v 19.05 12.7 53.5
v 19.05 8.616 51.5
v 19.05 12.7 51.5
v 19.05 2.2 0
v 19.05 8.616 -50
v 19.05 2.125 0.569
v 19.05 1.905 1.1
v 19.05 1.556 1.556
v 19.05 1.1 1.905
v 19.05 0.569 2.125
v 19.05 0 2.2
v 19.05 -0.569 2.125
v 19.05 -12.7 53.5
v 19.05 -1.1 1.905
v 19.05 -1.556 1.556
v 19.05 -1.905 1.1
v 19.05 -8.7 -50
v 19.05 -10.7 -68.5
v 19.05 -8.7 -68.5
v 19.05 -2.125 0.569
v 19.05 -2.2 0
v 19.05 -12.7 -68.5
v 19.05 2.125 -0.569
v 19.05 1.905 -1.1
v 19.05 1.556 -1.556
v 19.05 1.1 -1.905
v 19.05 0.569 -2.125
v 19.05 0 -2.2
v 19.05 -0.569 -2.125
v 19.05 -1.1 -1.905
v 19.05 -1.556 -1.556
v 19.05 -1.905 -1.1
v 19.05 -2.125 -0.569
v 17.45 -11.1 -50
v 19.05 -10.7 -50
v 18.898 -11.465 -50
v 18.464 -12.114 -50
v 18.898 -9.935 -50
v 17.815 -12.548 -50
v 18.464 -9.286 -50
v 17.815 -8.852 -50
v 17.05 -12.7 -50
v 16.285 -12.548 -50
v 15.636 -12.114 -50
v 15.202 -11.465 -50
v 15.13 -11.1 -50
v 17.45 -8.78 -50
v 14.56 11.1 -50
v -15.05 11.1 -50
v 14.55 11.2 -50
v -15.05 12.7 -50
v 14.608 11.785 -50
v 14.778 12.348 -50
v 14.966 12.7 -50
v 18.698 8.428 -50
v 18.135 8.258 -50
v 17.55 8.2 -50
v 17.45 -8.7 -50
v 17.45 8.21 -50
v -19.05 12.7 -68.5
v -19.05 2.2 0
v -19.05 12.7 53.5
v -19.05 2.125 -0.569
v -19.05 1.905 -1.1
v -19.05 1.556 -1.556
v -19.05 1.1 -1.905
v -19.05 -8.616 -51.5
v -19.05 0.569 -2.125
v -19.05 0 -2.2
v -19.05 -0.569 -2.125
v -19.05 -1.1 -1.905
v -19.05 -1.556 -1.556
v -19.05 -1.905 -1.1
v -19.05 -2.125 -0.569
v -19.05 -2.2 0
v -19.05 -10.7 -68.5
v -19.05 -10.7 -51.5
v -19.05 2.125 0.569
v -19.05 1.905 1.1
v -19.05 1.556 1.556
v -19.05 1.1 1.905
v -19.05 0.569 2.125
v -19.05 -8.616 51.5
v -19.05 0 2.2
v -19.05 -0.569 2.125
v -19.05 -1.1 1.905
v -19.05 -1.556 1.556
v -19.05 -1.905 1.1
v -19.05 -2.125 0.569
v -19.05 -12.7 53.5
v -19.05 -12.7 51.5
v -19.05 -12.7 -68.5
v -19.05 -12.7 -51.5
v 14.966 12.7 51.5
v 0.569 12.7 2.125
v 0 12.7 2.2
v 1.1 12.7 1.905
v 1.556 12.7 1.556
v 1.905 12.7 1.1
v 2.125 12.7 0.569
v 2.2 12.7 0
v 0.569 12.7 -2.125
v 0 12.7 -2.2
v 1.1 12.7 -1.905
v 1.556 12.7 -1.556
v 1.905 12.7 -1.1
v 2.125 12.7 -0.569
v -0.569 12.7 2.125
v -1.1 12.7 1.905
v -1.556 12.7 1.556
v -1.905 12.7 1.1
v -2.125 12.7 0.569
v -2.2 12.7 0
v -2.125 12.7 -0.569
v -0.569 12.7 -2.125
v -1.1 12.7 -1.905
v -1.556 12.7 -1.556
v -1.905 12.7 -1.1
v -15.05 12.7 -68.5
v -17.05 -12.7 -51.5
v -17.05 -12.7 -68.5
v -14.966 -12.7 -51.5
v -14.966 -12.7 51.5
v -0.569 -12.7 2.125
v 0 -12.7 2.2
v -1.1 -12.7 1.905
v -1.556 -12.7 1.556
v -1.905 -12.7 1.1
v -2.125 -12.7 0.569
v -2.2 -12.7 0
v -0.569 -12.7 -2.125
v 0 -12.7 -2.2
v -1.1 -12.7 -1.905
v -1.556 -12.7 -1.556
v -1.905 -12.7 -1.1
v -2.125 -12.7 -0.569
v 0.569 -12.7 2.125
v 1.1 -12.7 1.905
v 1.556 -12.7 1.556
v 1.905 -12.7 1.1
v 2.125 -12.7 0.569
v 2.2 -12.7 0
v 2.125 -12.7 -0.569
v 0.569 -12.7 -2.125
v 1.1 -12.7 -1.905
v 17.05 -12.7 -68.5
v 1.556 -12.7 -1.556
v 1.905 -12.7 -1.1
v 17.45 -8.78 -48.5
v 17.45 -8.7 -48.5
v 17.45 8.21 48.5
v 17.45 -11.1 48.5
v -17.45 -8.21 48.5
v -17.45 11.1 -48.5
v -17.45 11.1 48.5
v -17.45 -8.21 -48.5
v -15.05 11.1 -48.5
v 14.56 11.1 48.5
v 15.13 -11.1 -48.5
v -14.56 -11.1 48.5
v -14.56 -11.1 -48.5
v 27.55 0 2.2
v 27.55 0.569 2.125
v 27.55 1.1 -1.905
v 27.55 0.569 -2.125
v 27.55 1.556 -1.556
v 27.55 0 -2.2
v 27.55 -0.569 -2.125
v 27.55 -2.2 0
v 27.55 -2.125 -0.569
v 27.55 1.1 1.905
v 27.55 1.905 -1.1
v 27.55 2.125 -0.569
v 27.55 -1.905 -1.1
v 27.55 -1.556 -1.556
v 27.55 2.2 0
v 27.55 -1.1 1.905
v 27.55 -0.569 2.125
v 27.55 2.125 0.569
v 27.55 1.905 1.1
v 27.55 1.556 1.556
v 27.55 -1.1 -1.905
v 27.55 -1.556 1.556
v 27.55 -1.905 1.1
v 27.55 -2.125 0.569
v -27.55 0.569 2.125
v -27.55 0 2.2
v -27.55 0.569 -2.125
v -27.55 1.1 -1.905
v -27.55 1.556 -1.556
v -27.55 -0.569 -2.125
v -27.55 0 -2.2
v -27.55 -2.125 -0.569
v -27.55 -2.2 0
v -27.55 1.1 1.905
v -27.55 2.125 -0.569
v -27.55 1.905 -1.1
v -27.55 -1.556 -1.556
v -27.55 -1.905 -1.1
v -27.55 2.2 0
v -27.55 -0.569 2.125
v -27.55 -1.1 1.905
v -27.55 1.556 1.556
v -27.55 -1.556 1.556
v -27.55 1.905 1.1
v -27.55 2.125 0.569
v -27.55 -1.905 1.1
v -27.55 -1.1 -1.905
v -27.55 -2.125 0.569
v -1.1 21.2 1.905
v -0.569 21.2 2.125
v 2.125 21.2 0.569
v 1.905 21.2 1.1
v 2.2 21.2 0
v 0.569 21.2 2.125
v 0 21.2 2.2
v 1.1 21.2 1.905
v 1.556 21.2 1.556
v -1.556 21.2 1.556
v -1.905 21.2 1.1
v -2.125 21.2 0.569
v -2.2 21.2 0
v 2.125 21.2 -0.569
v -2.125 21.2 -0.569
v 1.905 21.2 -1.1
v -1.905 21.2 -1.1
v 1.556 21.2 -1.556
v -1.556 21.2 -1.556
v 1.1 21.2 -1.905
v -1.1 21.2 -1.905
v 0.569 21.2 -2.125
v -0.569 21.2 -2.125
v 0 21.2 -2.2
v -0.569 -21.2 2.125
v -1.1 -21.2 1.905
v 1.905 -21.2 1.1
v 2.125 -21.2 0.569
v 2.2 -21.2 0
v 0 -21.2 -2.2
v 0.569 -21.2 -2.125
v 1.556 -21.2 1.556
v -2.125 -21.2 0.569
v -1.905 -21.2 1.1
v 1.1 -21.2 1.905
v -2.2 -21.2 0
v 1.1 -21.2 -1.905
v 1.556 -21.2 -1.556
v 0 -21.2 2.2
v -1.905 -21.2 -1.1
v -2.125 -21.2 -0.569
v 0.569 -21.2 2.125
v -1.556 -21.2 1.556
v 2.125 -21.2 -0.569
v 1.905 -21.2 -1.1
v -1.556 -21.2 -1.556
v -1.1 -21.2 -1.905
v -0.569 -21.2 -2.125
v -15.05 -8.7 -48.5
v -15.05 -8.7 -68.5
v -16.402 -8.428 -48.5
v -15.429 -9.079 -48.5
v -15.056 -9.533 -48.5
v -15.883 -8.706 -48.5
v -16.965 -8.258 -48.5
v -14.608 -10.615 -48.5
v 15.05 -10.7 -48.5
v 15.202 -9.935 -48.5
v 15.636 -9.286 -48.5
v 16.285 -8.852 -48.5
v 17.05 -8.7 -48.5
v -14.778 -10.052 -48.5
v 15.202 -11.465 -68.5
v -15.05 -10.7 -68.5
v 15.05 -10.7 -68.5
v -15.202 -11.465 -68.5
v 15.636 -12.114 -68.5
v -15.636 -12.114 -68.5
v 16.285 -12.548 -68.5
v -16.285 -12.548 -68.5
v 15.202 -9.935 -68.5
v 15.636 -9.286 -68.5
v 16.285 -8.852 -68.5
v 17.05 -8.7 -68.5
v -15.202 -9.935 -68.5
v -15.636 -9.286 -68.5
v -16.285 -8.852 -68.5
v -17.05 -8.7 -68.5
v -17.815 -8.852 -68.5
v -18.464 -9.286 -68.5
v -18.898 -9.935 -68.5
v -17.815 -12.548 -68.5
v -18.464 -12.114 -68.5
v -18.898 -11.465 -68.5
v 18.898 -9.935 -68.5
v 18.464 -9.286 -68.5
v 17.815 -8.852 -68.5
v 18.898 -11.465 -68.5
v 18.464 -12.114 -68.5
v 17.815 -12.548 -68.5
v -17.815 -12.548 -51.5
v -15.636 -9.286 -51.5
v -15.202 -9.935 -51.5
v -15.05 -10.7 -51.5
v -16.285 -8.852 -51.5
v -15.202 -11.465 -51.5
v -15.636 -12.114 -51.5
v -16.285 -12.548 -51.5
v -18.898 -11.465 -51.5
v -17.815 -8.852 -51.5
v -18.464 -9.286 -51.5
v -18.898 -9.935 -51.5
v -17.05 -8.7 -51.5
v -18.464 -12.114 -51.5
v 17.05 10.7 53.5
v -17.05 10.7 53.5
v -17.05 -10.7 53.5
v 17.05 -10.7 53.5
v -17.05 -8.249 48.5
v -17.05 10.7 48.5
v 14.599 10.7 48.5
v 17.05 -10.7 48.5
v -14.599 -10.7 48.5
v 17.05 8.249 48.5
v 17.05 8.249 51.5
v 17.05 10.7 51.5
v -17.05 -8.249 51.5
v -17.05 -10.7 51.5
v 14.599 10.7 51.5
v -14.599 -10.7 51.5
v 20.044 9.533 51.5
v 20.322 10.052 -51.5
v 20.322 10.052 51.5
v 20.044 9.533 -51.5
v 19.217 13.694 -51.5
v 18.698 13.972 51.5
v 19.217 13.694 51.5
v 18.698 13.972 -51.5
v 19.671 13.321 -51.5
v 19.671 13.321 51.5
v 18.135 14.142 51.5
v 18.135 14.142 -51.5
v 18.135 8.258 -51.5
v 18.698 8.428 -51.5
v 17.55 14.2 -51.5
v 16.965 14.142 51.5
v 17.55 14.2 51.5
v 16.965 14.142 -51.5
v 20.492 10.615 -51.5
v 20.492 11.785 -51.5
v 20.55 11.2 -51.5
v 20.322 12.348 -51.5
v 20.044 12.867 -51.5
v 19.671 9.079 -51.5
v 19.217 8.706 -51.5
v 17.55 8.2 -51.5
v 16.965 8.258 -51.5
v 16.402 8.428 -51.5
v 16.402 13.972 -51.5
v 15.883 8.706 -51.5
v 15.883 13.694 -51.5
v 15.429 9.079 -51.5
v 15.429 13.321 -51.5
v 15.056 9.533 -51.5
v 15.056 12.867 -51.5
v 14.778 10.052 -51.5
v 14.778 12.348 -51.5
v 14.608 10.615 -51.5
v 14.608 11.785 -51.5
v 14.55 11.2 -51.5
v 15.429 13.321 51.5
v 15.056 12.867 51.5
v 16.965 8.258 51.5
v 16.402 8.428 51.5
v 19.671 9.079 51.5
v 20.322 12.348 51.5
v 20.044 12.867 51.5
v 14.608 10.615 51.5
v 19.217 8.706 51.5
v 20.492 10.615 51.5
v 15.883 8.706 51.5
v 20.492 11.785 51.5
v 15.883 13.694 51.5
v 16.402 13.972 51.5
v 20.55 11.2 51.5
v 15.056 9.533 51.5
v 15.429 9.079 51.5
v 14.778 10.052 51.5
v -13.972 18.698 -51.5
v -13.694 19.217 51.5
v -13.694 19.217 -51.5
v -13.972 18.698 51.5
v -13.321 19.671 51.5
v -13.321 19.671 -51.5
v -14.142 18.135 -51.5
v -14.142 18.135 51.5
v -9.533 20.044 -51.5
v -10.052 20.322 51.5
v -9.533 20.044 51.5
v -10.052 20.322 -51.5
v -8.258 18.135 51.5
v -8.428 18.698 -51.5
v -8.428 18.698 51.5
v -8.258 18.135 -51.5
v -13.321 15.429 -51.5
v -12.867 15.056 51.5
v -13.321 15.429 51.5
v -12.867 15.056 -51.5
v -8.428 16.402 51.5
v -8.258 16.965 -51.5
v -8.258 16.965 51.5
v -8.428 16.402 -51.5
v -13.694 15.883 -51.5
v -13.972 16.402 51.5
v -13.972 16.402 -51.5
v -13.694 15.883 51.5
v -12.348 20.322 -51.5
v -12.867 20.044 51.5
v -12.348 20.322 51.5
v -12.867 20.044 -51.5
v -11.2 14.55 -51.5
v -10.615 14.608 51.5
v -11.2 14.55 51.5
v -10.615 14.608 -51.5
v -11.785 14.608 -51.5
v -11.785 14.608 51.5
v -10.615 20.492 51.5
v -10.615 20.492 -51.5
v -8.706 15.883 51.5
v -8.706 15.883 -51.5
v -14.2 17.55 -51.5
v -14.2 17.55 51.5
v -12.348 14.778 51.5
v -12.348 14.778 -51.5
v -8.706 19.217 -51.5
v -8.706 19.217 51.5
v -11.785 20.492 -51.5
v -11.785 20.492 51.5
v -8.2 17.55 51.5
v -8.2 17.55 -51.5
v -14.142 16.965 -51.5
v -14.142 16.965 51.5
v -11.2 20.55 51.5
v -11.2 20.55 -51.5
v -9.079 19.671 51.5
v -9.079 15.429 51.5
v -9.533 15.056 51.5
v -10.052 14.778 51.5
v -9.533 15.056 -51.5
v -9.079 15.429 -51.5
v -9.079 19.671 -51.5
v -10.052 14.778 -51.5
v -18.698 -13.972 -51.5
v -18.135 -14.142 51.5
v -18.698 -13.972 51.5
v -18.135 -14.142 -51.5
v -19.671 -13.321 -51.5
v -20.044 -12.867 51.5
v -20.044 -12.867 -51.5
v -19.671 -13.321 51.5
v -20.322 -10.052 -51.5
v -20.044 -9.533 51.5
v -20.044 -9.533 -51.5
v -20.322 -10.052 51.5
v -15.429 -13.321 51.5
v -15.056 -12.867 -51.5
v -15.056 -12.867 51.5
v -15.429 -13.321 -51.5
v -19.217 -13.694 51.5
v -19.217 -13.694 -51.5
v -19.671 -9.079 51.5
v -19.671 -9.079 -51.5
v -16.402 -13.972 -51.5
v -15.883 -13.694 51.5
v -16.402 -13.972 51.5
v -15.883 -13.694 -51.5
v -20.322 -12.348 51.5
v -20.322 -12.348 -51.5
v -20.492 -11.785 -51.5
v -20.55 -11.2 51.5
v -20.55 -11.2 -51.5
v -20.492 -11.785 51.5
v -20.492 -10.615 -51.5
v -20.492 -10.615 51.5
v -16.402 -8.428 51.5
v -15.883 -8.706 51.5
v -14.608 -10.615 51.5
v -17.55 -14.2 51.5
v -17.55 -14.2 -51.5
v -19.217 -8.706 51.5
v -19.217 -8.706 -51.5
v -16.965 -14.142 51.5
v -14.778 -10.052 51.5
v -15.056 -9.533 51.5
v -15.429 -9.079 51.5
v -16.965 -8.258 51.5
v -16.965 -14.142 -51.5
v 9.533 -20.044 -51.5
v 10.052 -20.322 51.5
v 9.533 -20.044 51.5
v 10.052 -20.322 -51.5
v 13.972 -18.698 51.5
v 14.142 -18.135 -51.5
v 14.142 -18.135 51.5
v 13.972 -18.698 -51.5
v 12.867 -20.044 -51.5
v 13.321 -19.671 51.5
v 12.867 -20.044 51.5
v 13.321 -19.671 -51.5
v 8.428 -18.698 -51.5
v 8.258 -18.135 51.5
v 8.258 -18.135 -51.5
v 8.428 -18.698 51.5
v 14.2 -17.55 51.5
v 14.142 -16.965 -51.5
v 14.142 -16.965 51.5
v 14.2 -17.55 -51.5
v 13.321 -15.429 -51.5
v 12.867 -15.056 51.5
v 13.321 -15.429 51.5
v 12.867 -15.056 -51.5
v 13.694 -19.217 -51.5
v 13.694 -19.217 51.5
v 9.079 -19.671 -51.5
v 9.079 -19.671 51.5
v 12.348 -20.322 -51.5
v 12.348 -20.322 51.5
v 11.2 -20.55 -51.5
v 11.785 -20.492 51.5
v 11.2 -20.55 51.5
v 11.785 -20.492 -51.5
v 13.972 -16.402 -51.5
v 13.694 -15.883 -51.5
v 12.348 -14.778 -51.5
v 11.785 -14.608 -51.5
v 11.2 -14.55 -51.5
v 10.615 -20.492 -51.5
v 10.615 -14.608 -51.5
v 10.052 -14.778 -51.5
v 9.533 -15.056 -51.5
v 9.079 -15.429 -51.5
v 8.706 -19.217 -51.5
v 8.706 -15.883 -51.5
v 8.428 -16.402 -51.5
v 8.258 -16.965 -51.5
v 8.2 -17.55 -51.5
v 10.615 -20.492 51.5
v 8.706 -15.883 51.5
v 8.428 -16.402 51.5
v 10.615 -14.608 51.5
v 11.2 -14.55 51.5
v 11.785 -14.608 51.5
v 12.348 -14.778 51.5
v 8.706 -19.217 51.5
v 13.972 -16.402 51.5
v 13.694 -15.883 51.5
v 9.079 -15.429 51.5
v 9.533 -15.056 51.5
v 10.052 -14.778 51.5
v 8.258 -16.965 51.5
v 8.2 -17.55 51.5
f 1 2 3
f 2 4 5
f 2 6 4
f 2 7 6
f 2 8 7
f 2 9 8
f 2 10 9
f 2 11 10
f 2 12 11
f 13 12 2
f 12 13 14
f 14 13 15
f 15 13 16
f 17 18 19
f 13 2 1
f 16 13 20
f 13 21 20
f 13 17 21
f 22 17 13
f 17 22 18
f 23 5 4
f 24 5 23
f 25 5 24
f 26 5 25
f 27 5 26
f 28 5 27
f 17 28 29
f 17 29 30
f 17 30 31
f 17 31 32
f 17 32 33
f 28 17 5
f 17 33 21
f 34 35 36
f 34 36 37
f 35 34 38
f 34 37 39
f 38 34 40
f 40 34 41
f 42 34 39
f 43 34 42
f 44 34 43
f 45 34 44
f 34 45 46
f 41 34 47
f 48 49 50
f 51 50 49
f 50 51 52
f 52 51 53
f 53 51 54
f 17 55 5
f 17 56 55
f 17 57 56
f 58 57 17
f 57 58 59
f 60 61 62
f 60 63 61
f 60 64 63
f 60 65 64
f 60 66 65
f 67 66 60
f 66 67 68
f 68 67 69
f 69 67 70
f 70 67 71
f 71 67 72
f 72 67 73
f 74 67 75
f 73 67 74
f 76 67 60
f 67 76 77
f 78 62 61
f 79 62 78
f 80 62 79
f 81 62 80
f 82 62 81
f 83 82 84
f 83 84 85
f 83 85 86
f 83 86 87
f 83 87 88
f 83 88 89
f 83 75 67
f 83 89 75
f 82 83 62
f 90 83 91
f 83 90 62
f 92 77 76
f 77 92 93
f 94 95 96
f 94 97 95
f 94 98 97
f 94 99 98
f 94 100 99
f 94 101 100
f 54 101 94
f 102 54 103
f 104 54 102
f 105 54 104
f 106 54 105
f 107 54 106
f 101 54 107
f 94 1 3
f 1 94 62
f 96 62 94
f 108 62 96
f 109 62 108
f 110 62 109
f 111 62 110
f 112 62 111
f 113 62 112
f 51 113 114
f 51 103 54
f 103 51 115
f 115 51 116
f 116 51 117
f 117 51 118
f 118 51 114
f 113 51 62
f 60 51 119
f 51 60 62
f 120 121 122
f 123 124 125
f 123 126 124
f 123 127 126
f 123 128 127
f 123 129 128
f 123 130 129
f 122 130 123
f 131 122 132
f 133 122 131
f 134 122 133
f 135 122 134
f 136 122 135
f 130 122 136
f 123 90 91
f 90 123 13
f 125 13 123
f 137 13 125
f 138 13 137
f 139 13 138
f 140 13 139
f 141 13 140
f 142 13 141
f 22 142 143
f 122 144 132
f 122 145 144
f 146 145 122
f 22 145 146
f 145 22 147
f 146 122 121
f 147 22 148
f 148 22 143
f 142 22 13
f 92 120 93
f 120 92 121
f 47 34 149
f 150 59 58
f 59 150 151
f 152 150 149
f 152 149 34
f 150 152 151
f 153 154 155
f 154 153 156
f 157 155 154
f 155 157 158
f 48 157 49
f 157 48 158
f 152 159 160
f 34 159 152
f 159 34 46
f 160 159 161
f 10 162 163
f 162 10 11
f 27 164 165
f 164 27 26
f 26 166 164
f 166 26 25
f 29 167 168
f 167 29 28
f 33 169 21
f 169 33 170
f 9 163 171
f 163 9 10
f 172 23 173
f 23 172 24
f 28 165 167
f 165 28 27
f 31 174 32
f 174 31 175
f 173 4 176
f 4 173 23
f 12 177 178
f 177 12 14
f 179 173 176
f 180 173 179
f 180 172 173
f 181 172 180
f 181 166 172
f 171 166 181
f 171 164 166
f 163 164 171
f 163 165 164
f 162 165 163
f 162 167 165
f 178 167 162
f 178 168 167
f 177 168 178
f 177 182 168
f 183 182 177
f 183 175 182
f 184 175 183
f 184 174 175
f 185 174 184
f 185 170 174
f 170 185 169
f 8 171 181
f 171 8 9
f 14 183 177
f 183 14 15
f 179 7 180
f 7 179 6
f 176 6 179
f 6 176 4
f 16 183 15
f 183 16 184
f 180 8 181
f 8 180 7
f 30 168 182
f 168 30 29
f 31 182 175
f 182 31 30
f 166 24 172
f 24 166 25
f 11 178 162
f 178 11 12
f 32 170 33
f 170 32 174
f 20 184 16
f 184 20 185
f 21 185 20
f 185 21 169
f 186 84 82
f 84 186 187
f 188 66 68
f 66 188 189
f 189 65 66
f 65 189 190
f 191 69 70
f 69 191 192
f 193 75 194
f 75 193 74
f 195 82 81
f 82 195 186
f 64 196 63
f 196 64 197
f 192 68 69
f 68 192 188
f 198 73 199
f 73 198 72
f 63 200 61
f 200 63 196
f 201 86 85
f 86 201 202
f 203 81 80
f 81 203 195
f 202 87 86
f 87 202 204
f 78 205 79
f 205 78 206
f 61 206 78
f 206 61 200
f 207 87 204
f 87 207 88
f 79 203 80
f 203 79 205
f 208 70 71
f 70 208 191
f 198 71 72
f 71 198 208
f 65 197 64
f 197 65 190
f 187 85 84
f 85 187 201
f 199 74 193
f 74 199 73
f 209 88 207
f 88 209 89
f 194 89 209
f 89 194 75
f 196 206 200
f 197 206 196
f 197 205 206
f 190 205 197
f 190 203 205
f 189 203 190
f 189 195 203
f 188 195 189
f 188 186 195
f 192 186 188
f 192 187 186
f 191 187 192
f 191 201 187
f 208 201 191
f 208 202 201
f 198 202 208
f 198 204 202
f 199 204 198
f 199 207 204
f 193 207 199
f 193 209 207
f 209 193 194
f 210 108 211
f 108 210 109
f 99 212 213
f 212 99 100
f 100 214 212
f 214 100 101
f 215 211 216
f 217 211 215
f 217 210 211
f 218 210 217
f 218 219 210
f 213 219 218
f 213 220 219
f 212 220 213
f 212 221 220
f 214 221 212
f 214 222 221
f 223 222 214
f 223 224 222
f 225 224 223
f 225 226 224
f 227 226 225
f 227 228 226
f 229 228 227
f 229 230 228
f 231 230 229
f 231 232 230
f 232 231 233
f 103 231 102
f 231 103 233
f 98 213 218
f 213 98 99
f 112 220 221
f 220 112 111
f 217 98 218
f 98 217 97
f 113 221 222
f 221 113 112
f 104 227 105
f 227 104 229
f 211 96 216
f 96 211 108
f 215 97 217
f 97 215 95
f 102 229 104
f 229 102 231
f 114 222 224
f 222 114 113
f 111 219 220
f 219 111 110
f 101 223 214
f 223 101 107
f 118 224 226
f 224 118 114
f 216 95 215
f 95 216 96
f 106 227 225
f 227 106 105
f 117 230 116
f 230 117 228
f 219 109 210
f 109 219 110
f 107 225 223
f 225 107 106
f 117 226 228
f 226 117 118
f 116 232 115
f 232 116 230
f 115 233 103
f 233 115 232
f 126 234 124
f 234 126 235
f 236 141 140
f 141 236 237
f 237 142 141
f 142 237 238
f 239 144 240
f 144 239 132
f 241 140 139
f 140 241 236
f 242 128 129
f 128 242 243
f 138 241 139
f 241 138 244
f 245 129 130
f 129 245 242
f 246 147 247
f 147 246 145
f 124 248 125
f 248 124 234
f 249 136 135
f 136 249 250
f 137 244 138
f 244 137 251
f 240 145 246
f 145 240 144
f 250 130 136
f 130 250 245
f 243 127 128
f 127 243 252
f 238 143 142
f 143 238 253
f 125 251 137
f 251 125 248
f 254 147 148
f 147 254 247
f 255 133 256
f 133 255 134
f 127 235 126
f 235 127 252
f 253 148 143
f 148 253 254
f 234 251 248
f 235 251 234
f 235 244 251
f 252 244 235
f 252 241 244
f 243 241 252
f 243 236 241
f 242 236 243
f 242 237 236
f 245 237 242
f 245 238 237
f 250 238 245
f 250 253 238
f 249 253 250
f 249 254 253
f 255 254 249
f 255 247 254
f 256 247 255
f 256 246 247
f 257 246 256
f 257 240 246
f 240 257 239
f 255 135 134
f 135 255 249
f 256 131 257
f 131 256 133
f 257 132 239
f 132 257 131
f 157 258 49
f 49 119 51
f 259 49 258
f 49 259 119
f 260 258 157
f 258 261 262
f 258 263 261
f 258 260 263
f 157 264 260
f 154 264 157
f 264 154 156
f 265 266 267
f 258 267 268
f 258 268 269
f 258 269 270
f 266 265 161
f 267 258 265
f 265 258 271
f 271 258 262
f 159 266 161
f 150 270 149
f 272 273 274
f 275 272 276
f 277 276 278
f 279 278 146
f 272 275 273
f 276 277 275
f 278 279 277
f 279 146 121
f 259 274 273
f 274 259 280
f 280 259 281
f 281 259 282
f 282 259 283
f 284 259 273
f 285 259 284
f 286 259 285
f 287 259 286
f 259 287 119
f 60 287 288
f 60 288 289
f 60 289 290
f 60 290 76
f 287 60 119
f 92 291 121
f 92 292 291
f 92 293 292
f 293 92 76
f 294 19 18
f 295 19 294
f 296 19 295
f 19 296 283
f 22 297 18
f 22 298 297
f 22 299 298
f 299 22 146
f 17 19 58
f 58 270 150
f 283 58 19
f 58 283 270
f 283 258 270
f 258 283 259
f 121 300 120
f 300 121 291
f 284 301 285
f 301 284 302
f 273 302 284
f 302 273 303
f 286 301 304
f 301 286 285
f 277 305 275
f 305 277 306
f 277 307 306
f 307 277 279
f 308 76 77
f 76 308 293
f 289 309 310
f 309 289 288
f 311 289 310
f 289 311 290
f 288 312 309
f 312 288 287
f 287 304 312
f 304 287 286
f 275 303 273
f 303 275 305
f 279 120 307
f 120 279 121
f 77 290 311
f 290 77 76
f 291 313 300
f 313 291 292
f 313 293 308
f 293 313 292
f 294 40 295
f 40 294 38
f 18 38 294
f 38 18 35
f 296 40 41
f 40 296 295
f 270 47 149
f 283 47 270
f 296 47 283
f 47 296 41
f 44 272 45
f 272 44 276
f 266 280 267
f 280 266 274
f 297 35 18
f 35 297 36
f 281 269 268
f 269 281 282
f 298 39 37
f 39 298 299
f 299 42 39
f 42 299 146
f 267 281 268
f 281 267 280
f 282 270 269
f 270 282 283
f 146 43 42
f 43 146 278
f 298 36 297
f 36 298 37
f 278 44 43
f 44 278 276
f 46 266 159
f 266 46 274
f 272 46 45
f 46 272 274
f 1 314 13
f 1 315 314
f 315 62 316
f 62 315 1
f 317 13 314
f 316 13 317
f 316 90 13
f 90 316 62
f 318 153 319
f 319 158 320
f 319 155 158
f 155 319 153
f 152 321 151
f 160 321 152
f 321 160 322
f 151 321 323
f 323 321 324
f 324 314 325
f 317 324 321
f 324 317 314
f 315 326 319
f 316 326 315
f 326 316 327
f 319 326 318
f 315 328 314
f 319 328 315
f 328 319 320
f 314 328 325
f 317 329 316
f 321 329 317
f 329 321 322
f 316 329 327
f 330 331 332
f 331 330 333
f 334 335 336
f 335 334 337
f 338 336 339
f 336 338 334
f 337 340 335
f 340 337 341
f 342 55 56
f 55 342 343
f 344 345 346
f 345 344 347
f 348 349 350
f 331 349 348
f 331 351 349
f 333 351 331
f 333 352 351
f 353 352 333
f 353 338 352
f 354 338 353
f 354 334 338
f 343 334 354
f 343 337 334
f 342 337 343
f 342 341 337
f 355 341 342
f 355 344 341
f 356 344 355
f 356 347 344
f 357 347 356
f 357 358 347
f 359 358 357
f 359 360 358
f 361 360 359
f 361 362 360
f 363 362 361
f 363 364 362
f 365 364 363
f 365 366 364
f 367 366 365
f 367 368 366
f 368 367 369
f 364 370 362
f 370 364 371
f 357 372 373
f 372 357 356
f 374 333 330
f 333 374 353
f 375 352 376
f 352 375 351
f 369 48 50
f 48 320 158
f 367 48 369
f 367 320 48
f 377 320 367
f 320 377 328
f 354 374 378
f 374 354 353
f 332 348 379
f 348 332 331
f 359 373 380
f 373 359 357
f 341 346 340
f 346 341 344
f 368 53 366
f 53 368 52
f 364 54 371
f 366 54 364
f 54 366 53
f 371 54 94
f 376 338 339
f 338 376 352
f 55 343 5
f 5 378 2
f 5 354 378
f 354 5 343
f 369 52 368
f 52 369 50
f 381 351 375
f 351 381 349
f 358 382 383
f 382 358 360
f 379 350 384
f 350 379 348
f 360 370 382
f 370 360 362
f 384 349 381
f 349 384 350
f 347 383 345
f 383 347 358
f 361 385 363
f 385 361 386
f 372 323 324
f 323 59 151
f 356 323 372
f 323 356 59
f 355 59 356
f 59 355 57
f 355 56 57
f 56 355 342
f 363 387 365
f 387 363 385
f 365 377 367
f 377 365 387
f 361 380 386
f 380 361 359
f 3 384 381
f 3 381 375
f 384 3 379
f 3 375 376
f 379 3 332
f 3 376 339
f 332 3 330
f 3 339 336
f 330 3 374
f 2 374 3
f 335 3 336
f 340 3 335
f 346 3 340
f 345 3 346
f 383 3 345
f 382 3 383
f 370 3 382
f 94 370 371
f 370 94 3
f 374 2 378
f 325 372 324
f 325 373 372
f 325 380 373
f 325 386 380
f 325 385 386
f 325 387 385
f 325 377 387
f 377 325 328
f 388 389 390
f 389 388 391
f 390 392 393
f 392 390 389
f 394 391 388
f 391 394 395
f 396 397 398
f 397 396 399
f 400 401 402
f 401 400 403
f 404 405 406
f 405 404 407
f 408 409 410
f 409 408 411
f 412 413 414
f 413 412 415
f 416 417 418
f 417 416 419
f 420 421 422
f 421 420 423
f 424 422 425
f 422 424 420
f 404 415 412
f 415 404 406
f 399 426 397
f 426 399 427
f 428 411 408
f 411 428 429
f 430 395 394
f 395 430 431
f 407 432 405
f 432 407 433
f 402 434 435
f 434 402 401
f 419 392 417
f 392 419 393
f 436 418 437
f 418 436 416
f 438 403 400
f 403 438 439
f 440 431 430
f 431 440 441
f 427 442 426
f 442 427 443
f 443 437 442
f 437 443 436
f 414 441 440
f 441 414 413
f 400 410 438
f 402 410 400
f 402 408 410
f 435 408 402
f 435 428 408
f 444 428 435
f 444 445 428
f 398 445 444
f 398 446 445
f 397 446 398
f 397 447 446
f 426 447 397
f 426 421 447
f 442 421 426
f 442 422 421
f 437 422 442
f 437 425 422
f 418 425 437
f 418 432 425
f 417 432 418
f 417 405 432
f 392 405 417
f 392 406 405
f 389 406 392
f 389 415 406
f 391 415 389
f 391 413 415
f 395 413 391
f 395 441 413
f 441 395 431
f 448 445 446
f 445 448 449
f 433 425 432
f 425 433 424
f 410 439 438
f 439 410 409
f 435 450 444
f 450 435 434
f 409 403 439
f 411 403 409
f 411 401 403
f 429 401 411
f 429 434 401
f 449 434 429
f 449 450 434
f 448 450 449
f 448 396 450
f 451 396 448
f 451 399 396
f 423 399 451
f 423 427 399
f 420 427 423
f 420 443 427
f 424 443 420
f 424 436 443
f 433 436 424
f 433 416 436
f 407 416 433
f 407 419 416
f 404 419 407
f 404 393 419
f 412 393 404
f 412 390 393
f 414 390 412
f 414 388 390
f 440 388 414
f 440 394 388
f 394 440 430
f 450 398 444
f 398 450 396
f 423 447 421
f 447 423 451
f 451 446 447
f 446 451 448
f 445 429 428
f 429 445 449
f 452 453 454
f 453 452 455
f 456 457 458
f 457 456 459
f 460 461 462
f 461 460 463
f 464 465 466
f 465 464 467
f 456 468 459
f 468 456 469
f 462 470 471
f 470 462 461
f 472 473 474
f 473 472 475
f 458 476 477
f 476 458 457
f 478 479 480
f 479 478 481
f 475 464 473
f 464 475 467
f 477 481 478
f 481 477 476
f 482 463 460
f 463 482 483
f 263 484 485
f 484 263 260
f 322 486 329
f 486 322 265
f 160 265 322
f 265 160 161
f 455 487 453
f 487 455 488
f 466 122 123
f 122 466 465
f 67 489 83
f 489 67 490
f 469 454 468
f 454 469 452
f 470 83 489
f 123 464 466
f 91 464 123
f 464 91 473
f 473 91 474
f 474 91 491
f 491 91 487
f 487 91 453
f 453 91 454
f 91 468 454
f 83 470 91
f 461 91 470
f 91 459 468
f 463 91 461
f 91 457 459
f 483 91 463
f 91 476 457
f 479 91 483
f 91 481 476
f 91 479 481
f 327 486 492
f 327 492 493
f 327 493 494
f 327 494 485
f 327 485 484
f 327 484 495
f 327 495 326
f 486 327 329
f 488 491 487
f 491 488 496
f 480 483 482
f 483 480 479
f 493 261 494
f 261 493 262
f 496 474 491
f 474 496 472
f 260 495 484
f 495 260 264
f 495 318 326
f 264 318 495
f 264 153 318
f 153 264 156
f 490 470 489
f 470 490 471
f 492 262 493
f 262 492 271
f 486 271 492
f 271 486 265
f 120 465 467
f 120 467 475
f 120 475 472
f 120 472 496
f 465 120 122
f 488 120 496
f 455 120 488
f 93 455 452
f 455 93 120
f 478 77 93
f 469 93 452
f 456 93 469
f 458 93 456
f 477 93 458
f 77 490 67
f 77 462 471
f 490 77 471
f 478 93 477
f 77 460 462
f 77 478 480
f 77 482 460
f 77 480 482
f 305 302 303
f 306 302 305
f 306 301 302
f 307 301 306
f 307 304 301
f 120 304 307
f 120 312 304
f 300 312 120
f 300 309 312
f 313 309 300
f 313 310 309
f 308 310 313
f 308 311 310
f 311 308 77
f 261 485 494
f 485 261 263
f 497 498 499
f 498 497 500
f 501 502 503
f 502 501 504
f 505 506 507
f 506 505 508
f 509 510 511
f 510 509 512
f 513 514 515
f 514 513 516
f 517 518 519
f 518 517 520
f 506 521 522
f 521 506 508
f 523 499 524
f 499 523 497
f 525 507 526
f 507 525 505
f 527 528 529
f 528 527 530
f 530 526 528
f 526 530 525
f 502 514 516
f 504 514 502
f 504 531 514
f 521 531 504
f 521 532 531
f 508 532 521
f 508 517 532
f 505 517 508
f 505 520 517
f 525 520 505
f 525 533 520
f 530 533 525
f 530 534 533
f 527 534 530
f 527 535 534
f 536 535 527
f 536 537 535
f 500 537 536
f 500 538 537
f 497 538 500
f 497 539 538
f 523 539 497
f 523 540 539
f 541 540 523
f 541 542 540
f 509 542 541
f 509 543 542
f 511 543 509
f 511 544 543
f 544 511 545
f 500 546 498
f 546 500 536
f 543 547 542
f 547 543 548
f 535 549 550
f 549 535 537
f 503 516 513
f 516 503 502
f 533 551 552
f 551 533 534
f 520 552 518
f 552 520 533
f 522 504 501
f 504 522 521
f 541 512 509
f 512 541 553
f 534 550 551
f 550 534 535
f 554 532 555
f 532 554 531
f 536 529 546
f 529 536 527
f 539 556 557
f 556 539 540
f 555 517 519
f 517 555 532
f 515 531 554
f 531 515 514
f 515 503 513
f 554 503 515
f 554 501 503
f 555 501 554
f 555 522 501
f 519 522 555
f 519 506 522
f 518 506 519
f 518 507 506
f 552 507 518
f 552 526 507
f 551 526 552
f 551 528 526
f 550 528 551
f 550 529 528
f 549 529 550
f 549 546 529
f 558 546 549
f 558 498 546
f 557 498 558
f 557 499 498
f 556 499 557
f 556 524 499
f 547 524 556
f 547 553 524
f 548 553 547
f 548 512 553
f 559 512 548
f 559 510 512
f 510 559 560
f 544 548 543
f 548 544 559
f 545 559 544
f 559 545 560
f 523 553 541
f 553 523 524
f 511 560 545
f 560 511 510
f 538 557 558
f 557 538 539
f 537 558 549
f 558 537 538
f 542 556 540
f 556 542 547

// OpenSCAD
// Parameters
outer_width_mm = 38.1; //[19.05:76.2:0.1]
outer_height_mm = 25.4; //[12.7:50.8:0.1]
wall_thickness_mm = 1.6; //[0.8:3.2:0.1]
length_mm = 100; //[50:200:1]
center = 1; //[0:1:1]
eps_mm = 0.2; //[0.05:0.5:0.05]

// Connectivity overlap (1-2mm required)
overlap_mm = 1.5;

// Box Section - Primary Component
module box_section() {
  color("Silver") {
    difference() {
      cube([outer_width_mm, outer_height_mm, length_mm], center=true);
      cube([outer_width_mm - 2*wall_thickness_mm,
            outer_height_mm - 2*wall_thickness_mm,
            length_mm + 2*eps_mm], center=true);
    }
  }
}

// Box Shelf Bracket Section - Secondary Component
module box_shelf_bracket_section() {
  color("DimGray") {
    difference() {
      union() {
        // Vertical plate
        translate([-outer_width_mm/2, -outer_height_mm/2, 0])
          cube([4, outer_height_mm, 20], center=false);

        // Horizontal plate
        translate([-outer_width_mm/2, -outer_height_mm/2, 0])
          cube([outer_width_mm, 4, 20], center=false);
      }

      // Mounting holes
      translate([-outer_width_mm/2 + 2, -outer_height_mm/2 + 2, 10])
        cylinder(r=2, h=30, center=true, $fn=16);
      translate([ outer_width_mm/2 - 2, -outer_height_mm/2 + 2, 10])
        cylinder(r=2, h=30, center=true, $fn=16);
    }
  }
}

// Box Bezel Section - Secondary Component
module box_bezel_section() {
  color("Black") {
    difference() {
      cube([outer_width_mm, outer_height_mm, 5], center=true);
      cube([outer_width_mm - 4, outer_height_mm - 4, 6], center=true);
    }
  }
}

// Corner profiles (kept, but ensure they intersect the box with a small overlap)
module box_corner_profile_sections() {
  color("Silver") {
    // Push profiles slightly inward so they definitely intersect the box walls
    inset = overlap_mm; // ensures intersection even if rounding/preview artifacts occur
    for (i = [0:3]) {
      rotate([0, 0, i*90])
        translate([outer_width_mm/2 - inset, outer_height_mm/2 - inset, 0])
          rotate([0, 0, 45])
            cylinder(r=3, h=length_mm + 2*overlap_mm, center=true, $fn=32);
    }
  }
}

// FIX: Four small peg/handle-like protrusions around the box section
// They were floating/offset; now they are explicitly attached with 1-2mm overlap.
module side_pegs() {
  color("DimGray") {
    peg_r = 2.2;
    peg_len = 10;

    // Place pegs at mid-length, centered in Z
    zc = 0;

    // Ensure each peg penetrates into the box by overlap_mm:
    // For X-side pegs: center_x = outer_width/2 + peg_len/2 - overlap
    // For Y-side pegs: center_y = outer_height/2 + peg_len/2 - overlap
    cx = outer_width_mm/2  + peg_len/2 - overlap_mm;
    cy = outer_height_mm/2 + peg_len/2 - overlap_mm;

    // X+ peg
    translate([ cx, 0, zc])
      rotate([0, 90, 0])
        cylinder(r=peg_r, h=peg_len, center=true, $fn=24);

    // X- peg
    translate([-cx, 0, zc])
      rotate([0, 90, 0])
        cylinder(r=peg_r, h=peg_len, center=true, $fn=24);

    // Y+ peg
    translate([0,  cy, zc])
      rotate([90, 0, 0])
        cylinder(r=peg_r, h=peg_len, center=true, $fn=24);

    // Y- peg
    translate([0, -cy, zc])
      rotate([90, 0, 0])
        cylinder(r=peg_r, h=peg_len, center=true, $fn=24);
  }
}

// Assembly (ALL parts unioned and physically overlapping)
module assembly() {
  union() {
    // Main body
    box_section();

    // FIX: attach pegs to the box (overlapping by overlap_mm)
    side_pegs();

    // Bottom end attachment (bracket) - attach to -Z end with overlap
    // Box spans Z: [-length/2, +length/2]
    // Bracket spans local Z: [0, 20] (center=false)
    // Place bracket so its top penetrates into box by overlap_mm:
    // z0 + 20 = -length/2 + overlap_mm  => z0 = -length/2 + overlap_mm - 20
    translate([0, 0, (-length_mm/2) + overlap_mm - 20])
      box_shelf_bracket_section();

    // Top end attachment (bezel) - attach to +Z end with overlap
    // Bezel thickness = 5, centered. Place so it penetrates into box by overlap_mm:
    // bezel_center_z = +length/2 + (5/2) - overlap_mm
    translate([0, 0, (length_mm/2) + (5/2) - overlap_mm])
      box_bezel_section();

    // Corner profiles (unioned and forced to intersect slightly)
    box_corner_profile_sections();
  }
}

assembly();
